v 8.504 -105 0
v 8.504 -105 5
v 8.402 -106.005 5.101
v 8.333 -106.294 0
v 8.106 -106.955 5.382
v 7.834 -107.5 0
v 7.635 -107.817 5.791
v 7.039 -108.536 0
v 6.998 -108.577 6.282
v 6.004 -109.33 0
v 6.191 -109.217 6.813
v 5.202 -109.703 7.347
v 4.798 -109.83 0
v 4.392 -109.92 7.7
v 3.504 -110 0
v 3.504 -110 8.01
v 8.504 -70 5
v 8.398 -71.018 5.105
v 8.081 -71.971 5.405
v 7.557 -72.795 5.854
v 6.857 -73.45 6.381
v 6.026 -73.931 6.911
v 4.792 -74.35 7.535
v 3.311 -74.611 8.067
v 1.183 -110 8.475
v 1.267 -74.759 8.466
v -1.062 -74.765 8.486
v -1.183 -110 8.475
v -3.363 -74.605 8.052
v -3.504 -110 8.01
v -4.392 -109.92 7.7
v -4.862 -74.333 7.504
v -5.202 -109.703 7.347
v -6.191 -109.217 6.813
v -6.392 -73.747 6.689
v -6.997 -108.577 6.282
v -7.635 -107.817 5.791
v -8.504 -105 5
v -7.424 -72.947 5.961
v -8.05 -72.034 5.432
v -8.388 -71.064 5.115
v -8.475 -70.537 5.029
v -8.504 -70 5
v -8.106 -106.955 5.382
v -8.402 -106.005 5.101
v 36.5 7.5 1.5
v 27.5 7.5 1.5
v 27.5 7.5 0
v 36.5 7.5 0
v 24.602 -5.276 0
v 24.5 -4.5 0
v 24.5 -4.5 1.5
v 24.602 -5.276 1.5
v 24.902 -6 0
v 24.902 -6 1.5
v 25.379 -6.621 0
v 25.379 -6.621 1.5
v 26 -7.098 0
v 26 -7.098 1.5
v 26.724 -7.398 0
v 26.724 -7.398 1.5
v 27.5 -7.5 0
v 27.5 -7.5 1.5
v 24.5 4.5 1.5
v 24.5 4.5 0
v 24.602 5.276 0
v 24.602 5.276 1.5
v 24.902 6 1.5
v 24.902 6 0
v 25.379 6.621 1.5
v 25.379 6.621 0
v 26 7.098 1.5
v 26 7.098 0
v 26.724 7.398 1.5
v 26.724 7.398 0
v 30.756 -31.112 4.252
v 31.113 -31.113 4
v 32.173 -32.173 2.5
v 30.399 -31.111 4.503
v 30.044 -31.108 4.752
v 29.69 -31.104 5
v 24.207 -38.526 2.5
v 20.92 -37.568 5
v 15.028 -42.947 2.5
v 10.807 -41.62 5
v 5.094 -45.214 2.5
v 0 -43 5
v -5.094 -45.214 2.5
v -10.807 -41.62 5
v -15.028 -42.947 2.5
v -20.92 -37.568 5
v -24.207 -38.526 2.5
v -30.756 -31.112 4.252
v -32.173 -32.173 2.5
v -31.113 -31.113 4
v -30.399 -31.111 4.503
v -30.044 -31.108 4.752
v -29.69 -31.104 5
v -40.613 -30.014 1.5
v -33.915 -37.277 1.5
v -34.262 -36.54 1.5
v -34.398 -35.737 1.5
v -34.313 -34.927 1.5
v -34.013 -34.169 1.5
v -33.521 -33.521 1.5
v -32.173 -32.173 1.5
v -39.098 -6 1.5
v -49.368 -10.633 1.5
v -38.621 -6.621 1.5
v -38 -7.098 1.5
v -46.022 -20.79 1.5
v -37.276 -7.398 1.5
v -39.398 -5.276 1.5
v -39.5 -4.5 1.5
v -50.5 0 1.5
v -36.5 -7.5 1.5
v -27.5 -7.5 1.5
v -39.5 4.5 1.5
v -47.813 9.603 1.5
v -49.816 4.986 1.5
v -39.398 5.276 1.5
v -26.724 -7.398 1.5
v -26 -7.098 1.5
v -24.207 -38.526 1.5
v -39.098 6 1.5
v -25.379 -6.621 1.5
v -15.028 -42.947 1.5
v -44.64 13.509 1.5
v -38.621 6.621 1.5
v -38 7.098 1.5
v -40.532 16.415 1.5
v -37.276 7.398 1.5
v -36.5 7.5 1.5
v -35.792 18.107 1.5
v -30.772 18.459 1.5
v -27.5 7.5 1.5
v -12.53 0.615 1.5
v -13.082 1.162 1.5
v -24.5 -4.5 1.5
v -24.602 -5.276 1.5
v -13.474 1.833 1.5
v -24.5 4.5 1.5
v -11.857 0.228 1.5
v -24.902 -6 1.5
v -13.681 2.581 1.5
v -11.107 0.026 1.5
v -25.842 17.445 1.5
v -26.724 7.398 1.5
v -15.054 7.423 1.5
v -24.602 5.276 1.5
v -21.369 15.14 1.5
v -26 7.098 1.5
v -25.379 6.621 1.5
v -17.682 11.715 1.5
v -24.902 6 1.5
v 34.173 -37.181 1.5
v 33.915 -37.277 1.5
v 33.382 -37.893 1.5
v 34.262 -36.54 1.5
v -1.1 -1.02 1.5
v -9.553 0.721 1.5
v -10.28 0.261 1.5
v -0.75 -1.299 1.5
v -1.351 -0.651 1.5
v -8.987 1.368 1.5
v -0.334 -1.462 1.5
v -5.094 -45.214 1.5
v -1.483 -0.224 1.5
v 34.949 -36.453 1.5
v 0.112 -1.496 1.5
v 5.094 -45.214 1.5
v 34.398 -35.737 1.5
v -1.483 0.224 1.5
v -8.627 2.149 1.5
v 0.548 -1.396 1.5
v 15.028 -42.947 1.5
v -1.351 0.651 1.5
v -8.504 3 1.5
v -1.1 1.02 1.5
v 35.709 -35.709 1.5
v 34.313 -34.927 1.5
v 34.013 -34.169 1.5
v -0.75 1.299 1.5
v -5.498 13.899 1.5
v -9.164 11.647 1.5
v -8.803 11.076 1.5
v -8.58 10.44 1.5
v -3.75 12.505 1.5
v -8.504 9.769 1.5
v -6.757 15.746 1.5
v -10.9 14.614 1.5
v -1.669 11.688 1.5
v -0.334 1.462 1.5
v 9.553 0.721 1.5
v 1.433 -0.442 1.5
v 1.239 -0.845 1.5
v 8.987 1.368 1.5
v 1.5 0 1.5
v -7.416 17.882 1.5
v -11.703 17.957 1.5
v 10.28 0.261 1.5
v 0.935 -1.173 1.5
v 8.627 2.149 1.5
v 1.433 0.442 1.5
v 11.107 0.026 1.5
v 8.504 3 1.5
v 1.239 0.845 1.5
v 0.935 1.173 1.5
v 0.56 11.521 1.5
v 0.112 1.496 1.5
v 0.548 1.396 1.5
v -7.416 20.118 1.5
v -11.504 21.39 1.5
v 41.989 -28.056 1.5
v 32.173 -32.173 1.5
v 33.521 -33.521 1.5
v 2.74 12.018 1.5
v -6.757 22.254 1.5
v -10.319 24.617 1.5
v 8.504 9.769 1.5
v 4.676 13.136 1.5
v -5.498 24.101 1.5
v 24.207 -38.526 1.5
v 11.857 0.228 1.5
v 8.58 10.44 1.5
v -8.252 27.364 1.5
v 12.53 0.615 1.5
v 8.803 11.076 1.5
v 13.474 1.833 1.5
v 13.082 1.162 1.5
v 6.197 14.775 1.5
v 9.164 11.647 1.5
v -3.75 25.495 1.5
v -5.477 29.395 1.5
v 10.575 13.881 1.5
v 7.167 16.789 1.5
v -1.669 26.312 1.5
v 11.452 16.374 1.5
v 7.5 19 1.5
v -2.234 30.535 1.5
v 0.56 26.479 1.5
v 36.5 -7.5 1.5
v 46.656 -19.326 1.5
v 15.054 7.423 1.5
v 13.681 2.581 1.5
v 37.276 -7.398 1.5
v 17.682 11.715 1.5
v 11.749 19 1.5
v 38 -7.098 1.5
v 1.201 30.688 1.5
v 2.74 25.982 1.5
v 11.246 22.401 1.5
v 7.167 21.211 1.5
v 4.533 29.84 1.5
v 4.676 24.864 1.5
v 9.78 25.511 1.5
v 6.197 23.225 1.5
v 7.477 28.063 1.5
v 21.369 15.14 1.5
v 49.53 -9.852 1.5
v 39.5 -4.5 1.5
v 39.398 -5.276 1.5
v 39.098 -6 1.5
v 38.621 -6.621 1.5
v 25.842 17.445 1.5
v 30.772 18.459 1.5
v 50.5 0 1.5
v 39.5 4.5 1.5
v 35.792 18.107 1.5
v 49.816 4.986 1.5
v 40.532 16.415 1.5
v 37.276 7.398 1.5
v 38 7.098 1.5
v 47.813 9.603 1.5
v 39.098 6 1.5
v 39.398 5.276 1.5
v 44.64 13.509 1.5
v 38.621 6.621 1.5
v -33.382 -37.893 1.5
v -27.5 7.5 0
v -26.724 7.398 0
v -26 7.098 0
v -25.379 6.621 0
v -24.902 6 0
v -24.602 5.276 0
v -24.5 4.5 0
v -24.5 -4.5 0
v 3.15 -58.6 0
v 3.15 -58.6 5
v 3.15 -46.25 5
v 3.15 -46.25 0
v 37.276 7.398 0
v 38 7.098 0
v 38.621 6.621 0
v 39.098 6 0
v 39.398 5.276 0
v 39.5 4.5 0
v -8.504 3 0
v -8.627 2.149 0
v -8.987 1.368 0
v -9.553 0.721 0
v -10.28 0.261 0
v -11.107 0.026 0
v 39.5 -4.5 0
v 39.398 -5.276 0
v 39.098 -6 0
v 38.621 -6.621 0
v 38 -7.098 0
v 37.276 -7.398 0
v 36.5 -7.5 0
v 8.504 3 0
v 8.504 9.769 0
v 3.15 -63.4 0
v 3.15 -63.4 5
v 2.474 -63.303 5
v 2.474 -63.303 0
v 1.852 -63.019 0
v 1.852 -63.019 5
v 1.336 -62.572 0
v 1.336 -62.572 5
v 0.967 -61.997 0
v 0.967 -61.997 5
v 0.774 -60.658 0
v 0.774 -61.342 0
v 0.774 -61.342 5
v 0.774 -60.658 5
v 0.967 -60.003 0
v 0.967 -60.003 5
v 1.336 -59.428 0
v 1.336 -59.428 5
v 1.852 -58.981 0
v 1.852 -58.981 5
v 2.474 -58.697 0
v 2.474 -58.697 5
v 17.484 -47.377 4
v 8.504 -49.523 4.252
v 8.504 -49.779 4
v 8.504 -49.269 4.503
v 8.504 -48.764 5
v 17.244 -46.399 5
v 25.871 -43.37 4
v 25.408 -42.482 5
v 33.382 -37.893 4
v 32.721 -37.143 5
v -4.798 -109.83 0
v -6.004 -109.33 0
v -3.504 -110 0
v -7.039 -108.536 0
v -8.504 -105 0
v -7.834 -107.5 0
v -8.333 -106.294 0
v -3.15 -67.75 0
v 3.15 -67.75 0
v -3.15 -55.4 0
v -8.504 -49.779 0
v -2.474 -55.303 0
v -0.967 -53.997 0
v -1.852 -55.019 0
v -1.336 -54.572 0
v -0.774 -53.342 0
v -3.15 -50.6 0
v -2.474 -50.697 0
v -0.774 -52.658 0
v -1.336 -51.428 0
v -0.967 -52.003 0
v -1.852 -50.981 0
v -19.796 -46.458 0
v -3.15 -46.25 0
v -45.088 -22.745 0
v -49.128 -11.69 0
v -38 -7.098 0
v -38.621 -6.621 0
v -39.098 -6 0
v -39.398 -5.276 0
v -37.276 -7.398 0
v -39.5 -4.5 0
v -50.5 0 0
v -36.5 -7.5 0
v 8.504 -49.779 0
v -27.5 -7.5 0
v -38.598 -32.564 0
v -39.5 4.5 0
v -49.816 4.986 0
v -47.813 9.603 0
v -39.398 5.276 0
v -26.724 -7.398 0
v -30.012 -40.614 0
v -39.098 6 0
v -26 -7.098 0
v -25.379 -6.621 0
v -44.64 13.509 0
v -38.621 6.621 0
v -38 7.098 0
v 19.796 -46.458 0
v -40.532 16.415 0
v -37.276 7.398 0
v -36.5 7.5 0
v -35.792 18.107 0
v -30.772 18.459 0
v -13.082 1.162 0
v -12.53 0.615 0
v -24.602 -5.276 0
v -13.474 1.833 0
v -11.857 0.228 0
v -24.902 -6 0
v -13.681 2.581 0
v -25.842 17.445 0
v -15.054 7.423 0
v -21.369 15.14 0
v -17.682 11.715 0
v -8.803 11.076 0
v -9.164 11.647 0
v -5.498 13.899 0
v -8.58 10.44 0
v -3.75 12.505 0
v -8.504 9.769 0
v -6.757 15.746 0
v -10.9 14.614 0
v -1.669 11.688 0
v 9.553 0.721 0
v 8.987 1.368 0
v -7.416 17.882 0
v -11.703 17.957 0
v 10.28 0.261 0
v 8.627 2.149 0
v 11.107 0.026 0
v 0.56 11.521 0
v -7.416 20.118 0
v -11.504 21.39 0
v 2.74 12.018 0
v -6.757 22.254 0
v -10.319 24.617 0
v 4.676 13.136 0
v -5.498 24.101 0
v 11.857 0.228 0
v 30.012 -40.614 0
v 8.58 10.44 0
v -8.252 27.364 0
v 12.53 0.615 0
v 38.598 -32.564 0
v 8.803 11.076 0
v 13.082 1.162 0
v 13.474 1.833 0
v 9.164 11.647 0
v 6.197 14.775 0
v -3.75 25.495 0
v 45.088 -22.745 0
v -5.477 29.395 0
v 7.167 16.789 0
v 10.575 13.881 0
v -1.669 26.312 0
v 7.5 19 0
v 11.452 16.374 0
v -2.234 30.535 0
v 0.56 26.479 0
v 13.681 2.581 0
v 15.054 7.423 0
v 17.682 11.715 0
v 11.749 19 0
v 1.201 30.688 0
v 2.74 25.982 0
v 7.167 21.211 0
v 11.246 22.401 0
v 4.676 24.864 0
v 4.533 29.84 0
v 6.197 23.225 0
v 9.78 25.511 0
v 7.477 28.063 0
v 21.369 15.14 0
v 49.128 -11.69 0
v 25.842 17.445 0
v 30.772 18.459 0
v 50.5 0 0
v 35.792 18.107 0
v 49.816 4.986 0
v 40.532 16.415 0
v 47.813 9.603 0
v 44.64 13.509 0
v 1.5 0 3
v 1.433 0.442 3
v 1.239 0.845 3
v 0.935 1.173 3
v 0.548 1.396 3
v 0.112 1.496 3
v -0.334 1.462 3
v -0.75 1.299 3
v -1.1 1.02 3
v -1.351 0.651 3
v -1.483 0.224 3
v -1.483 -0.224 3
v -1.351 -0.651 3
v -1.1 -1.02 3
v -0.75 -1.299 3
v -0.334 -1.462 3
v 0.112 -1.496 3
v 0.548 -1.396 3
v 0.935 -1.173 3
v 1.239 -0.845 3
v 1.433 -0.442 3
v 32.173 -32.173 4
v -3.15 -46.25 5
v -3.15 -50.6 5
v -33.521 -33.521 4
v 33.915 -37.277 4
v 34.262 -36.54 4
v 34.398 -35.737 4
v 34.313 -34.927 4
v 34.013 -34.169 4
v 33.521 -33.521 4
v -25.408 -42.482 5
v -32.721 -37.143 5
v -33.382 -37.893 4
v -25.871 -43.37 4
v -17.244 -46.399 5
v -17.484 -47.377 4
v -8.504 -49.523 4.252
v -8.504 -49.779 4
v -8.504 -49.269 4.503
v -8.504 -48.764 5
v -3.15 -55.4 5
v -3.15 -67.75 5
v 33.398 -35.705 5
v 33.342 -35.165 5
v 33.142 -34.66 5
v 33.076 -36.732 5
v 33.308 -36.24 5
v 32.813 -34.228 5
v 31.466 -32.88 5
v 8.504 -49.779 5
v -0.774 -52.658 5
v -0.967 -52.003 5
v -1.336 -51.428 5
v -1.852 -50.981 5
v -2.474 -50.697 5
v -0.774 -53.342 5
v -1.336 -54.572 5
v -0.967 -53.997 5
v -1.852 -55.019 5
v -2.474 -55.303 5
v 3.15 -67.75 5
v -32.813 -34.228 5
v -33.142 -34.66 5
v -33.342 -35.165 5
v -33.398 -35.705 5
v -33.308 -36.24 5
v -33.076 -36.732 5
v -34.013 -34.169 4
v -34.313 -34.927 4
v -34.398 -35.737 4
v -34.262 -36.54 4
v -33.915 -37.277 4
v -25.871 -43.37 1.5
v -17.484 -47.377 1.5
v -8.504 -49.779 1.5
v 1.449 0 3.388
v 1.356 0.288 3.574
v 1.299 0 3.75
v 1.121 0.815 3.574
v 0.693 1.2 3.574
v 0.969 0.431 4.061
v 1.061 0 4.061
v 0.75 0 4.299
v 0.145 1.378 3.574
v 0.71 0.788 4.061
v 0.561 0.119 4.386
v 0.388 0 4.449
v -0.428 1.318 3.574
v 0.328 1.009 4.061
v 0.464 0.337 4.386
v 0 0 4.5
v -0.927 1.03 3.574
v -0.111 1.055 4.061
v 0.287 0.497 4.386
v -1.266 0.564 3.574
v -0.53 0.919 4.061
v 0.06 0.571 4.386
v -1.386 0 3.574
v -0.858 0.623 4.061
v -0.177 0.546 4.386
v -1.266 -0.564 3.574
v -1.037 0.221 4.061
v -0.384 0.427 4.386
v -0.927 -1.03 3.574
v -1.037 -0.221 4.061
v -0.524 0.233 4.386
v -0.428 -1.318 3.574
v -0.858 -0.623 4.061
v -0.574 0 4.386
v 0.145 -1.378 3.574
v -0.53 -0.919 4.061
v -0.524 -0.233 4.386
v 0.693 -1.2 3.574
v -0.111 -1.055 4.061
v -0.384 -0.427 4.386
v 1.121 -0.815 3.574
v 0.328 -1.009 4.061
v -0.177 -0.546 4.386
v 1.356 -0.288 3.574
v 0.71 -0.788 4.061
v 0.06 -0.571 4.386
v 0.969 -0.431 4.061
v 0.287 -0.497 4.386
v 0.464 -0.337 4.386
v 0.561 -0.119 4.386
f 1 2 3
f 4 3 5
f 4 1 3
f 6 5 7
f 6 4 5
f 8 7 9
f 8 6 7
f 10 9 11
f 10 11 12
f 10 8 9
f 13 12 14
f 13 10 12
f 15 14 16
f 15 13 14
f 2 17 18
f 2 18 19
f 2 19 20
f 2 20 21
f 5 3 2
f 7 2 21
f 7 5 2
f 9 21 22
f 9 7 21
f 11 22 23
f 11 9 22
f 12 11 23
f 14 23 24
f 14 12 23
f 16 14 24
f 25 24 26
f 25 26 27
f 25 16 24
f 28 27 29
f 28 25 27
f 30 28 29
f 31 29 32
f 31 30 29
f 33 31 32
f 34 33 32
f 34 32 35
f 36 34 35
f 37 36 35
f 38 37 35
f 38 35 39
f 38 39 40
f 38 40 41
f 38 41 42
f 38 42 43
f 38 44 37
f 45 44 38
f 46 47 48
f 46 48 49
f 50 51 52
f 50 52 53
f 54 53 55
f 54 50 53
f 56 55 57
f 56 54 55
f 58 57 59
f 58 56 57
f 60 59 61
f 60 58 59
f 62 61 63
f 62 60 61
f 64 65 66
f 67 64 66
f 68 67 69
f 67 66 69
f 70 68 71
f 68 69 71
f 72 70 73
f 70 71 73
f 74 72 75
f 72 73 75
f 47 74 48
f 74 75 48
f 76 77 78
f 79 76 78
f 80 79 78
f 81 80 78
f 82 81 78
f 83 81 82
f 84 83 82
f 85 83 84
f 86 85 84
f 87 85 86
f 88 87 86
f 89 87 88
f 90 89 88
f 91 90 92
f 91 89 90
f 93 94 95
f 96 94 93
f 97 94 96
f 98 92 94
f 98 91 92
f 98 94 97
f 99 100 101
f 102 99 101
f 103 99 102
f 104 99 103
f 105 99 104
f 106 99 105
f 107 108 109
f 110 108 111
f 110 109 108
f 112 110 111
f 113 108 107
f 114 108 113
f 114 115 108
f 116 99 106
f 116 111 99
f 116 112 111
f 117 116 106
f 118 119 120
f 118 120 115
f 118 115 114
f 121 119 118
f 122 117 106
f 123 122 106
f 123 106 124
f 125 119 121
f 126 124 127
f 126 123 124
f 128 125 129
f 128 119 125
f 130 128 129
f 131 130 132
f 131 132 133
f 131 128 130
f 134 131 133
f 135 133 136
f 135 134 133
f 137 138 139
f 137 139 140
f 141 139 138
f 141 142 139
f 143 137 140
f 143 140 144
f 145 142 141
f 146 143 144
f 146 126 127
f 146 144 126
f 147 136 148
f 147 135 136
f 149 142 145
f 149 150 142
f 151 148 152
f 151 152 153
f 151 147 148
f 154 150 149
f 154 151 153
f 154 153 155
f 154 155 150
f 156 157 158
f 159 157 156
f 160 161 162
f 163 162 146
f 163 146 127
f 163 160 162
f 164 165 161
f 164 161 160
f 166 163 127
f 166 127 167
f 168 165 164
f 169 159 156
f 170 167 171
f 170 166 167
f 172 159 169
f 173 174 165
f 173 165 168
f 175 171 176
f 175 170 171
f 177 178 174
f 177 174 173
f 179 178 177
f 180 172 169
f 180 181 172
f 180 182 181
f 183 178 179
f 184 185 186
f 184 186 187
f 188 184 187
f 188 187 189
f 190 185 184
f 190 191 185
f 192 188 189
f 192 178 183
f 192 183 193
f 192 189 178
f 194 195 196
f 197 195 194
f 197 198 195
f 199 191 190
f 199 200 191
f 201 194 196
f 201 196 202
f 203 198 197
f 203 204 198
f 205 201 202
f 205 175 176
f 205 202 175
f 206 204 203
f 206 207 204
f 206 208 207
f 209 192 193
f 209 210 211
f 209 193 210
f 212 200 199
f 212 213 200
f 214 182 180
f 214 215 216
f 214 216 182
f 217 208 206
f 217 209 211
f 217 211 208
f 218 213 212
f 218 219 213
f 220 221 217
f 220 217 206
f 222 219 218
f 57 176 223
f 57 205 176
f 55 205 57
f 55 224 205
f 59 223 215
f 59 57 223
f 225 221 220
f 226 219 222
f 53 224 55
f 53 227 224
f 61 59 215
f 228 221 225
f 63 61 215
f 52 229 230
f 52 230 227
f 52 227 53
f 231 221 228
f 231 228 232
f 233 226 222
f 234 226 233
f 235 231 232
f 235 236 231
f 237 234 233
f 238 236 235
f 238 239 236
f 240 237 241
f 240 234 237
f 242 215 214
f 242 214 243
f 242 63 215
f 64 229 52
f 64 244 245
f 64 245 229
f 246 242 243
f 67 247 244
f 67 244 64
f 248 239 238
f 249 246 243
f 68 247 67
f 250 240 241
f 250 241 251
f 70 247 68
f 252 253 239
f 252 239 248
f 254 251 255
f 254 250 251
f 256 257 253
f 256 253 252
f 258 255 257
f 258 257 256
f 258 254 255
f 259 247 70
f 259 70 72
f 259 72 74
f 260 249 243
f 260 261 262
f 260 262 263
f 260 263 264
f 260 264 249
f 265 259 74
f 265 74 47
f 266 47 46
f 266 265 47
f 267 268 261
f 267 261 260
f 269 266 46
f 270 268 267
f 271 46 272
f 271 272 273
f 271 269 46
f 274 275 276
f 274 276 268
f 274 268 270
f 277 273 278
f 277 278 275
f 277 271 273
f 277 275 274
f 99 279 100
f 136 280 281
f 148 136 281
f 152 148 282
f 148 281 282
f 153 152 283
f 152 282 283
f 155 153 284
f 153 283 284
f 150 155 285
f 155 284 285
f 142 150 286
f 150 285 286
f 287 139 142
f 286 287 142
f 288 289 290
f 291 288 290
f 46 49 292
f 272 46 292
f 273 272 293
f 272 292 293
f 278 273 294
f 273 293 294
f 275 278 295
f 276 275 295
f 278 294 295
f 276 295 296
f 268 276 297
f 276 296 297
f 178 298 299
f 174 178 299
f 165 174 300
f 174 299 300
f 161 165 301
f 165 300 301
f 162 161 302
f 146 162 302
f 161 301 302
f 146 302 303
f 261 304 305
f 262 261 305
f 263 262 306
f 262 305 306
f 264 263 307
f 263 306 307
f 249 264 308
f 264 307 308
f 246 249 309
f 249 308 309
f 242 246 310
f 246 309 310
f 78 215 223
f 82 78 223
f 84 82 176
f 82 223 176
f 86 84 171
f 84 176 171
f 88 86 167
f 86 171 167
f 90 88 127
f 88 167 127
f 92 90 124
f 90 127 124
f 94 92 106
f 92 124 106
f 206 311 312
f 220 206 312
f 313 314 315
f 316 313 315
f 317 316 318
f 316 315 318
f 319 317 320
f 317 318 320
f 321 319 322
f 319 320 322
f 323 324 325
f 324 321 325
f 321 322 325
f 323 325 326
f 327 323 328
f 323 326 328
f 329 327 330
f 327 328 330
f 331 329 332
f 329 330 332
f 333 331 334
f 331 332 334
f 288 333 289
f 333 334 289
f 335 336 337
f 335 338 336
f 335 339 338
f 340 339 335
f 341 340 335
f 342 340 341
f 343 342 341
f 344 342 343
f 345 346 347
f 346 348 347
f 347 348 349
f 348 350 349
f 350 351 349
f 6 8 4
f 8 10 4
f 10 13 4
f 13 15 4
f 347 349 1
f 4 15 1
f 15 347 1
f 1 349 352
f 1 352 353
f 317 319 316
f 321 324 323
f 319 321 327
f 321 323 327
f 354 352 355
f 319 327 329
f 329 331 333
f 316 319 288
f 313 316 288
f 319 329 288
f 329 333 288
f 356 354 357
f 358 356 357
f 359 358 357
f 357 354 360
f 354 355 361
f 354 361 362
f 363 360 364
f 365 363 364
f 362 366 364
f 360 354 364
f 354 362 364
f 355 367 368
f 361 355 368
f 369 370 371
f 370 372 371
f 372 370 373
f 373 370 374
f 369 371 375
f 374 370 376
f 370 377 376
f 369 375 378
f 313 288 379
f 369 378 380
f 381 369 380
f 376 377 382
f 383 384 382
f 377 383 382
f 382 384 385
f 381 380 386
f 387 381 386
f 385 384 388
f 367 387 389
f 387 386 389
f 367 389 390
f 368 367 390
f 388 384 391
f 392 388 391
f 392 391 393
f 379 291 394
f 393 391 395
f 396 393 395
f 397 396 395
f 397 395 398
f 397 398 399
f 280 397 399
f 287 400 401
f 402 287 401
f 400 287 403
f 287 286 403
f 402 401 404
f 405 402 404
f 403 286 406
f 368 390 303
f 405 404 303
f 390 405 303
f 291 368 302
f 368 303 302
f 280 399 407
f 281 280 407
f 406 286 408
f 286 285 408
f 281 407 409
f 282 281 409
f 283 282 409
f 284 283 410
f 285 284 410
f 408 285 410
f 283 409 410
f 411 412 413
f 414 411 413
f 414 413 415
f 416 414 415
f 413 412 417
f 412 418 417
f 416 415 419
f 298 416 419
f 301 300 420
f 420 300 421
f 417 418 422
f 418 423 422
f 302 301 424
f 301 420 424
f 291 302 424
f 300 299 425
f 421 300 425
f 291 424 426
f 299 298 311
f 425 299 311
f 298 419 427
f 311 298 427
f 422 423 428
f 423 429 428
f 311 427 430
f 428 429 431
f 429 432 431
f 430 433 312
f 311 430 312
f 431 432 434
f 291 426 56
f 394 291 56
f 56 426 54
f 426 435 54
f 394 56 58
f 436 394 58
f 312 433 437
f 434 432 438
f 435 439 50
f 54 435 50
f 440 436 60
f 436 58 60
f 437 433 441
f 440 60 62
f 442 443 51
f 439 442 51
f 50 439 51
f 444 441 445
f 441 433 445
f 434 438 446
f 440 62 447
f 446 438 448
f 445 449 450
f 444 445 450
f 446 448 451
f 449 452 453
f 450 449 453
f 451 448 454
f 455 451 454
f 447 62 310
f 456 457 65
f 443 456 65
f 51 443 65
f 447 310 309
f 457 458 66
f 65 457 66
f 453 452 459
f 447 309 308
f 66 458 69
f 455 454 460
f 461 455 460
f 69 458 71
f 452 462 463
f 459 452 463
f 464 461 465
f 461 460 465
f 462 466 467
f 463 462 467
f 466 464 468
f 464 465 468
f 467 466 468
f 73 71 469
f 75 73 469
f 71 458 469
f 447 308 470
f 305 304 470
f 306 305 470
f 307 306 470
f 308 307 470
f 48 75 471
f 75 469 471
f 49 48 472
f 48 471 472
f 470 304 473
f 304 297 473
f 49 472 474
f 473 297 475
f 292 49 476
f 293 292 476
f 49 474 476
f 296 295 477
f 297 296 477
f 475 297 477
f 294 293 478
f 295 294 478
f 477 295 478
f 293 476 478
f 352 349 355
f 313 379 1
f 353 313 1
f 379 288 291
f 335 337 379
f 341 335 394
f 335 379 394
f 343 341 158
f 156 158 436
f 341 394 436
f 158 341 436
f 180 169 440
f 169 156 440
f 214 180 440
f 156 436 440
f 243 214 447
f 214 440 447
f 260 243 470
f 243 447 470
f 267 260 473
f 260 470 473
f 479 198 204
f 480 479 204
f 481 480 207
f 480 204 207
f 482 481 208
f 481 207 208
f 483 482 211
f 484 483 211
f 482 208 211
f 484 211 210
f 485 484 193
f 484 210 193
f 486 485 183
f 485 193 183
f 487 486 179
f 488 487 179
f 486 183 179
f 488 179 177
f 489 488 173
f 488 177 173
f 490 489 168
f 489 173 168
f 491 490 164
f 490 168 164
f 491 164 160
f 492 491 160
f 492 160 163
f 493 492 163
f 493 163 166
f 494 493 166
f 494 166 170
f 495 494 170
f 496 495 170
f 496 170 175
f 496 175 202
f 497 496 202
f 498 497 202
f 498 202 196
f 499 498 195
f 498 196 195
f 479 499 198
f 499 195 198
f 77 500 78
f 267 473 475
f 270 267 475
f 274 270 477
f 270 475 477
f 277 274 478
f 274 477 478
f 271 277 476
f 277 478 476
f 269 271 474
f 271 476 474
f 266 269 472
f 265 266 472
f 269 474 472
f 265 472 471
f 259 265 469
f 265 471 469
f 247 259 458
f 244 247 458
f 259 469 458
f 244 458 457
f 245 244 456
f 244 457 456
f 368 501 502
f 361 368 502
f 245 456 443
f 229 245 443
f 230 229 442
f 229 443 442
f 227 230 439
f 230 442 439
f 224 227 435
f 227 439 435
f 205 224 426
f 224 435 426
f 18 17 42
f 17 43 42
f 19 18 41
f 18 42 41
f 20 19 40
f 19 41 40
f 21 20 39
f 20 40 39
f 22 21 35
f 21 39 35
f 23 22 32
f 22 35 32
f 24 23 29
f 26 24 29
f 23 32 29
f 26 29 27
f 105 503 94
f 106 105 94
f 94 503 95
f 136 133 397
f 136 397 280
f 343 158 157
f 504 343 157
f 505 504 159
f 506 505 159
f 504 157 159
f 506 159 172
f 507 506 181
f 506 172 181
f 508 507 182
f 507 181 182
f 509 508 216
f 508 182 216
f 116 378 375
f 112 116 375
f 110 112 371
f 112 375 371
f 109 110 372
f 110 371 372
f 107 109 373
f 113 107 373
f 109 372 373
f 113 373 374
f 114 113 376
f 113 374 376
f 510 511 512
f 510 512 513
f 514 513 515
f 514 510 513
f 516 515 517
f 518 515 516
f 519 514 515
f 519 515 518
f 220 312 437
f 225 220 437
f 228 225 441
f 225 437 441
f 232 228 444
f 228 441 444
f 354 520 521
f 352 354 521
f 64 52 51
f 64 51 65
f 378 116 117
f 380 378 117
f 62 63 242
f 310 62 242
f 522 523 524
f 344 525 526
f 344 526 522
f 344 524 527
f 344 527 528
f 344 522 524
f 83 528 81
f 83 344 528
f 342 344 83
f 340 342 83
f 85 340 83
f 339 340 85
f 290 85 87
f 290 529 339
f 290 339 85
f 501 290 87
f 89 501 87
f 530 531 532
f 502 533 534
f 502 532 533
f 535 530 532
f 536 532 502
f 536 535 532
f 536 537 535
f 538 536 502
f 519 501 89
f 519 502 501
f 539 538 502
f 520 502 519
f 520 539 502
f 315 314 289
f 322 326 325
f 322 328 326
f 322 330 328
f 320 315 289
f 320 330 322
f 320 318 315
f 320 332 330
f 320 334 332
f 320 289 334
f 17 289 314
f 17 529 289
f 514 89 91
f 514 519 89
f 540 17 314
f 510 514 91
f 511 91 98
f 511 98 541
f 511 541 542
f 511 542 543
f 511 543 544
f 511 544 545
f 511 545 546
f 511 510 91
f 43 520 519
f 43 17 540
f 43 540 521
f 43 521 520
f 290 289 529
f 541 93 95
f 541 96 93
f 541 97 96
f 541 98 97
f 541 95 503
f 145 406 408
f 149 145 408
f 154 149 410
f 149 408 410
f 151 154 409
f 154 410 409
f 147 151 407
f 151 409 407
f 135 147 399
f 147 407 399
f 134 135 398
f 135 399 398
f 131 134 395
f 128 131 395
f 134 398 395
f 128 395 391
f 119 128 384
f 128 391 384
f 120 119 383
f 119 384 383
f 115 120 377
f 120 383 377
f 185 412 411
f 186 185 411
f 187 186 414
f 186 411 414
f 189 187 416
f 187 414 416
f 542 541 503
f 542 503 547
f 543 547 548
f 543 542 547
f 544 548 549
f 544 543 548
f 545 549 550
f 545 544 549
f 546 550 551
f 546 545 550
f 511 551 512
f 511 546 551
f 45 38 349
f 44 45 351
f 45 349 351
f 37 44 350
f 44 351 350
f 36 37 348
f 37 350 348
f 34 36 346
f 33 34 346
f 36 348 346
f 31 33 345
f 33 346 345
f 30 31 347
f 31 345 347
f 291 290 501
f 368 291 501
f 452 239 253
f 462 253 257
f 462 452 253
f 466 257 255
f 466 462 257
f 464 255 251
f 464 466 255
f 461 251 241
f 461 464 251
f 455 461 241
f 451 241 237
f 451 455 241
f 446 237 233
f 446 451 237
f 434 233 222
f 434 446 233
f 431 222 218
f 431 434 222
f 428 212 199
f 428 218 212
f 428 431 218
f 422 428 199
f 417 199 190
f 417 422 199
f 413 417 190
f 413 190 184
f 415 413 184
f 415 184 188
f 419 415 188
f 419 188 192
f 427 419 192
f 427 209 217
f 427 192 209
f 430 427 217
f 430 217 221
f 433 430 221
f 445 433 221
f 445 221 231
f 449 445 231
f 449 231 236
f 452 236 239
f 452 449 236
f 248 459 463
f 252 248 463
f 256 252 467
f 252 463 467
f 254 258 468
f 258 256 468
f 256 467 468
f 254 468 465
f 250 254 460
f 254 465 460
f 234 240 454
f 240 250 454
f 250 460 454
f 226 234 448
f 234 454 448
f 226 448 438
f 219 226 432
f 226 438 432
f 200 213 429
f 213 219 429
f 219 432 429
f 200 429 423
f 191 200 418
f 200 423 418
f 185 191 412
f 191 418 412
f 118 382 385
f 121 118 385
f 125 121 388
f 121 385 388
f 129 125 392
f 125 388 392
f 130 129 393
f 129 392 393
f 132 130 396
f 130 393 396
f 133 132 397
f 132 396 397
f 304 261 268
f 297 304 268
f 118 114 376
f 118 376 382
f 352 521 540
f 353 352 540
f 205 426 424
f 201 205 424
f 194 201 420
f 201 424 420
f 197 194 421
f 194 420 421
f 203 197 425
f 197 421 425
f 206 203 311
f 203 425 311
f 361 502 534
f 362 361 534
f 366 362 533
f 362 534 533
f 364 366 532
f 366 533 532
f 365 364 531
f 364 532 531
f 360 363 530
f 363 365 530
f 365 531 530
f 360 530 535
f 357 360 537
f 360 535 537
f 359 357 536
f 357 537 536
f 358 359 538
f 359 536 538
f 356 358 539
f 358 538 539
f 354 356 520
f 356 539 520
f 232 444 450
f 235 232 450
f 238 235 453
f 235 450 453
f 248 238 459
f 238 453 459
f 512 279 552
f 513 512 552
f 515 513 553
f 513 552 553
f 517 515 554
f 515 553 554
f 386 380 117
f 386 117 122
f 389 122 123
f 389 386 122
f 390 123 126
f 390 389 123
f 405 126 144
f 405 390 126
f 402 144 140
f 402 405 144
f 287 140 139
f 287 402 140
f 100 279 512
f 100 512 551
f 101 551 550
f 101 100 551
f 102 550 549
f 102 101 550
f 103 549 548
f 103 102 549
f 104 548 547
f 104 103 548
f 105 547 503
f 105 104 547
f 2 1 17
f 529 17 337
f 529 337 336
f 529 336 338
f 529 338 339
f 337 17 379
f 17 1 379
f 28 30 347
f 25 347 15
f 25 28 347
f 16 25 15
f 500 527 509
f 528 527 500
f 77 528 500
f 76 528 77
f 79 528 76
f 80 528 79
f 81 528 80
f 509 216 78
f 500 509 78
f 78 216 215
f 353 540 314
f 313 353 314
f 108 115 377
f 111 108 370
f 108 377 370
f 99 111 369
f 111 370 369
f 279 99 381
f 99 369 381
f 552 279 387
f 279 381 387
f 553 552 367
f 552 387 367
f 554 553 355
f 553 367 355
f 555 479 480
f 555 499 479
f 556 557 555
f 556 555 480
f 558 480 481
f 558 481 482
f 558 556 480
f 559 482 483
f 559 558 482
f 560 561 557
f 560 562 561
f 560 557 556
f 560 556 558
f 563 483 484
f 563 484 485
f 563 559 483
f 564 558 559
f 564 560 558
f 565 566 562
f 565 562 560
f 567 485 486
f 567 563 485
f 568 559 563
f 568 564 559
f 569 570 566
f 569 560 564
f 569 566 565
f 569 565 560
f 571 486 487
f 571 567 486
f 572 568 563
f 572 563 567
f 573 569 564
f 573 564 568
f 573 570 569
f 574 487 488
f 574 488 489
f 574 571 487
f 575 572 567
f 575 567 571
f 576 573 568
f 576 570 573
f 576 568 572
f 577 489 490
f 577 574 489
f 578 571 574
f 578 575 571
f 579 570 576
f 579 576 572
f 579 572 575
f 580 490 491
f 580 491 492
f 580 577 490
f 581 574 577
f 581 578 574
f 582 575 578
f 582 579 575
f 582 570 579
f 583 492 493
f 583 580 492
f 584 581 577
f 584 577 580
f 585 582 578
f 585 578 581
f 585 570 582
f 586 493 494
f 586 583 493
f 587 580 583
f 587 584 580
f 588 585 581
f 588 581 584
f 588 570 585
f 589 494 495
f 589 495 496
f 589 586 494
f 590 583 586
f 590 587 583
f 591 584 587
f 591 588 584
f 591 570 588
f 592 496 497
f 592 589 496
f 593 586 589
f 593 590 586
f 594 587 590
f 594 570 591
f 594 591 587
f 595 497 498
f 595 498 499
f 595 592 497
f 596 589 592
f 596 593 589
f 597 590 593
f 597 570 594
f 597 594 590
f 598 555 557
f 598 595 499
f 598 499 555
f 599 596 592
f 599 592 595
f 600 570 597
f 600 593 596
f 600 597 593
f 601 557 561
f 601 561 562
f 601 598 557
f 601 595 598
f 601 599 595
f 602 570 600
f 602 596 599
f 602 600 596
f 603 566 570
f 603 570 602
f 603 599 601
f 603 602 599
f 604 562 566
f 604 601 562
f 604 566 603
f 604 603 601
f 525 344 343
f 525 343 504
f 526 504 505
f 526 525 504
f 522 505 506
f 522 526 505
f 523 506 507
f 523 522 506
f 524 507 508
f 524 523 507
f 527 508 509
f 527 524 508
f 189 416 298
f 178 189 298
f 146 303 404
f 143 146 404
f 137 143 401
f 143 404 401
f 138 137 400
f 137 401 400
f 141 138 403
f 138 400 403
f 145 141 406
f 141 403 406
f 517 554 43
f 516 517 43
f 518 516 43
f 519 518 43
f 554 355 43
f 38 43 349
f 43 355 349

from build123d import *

# Parameters (mm, degrees)
F1_DEPTH     = 5
F3_DEPTH     = 5.001
F5_DEPTH     = 35
F6_T4_DEPTH  = 17.0072864353
F6_S5_R      = 12
F6_T6_DEPTH  = 11
F6_T7_DEPTH  = 30
F7_R         = 7.5
F8_DEPTH     = 5
F9_R         = 45.5
F10_DEPTH    = 3.5
F12_DEPTH    = 1.5
F14_DEPTH    = 3.5
F18_W        = 15
F18_H        = 15
F19_DEPTH    = 1.5010001
F20_DEPTH    = 5.0010001
F21_R        = 1.5
F22_DEPTH    = 3
F23_T1_DEPTH = 1.5
F23_T3_DEPTH = 11.4776669635
F24_R        = 1.5
F25_SIZE     = 1


# Not quite as in the source:
# - a fillet or chamfer that OpenCascade refuses, or shapes differently, is made with other operations: its cross-section is extruded or revolved along the edge and cut away or added
# - a feature names something its author has since deleted; it is built from what else it names


with BuildPart() as f1:
    # F0 (on Top) → F1 (new body)
    with BuildSketch(Plane.XY):
        Polygon((8.5036432176, -40), (-8.5036432176, -40), (-8.5036432176, -110), (0, -110), (8.5036432176, -110), align=None)
    extrude(amount=F1_DEPTH)

    # F2 (on face) → F3 (cut, through all)
    with BuildSketch(Plane.XY.offset(5)):
        with BuildLine():
            Line((-3.15, -67.75), (3.15, -67.75))
            Line((3.15, -67.75), (3.15, -63.4))
            ThreePointArc((3.15, -63.4), (0.75, -61), (3.15, -58.6))
            Line((3.15, -58.6), (3.15, -46.25))
            Line((3.15, -46.25), (-3.15, -46.25))
            Line((-3.15, -46.25), (-3.15, -50.6))
            ThreePointArc((-3.15, -50.6), (-0.75, -53), (-3.15, -55.4))
            Line((-3.15, -55.4), (-3.15, -67.75))
        make_face()
    extrude(amount=-F3_DEPTH, mode=Mode.SUBTRACT)

    # F4 (on face) → F5 (join)
    with BuildSketch(Plane.XZ.offset(110)):
        with BuildLine():
            ThreePointArc((8.5036432176, 5), (0, 8.5331202898), (-8.5036432176, 5))
            Line((-8.5036432176, 5), (8.5036432176, 5))
        make_face()
    extrude(amount=-F5_DEPTH)

    # F6: fillet of radius 5 on 3 edges, made by hand


with BuildPart() as f6_tool2:
    # F6_s3 → F6_t4 (new body)
    with BuildSketch(Plane.YZ.offset(-8.5036432176)):
        with BuildLine():
            ThreePointArc((-70, 5), (-73.5355339059, 6.4644660941), (-75, 10))
            Line((-75, 10), (-75, 5))
            Line((-75, 5), (-70, 5))
        make_face()
    extrude(amount=F6_T4_DEPTH)

    # F6_s5 → F6_t6 (intersect, symmetric)
    with BuildSketch(Plane.XZ.offset(72.5)):
        with Locations((0, -3.4668797102)):
            Circle(F6_S5_R)
    extrude(amount=F6_T6_DEPTH, both=True, mode=Mode.INTERSECT)


with BuildPart() as f1_1:
    add(f1.part)

    # F6_t1: union F6_tool2
    add(f6_tool2.part)

    # F6_s8 → F6_t7 (cut)
    with BuildSketch(Plane.XY.offset(-12.5)):
        with BuildLine():
            ThreePointArc((-8.5036432176, -105), (-7.0391771236, -108.5355339059), (-3.5036432176, -110))
            Line((-3.5036432176, -110), (-8.5036432176, -110))
            Line((-8.5036432176, -110), (-8.5036432176, -105))
        make_face()
        with BuildLine():
            ThreePointArc((8.5036432176, -105), (7.0391771236, -108.5355339059), (3.5036432176, -110))
            Line((3.5036432176, -110), (8.5036432176, -110))
            Line((8.5036432176, -110), (8.5036432176, -105))
        make_face()
    extrude(amount=F6_T7_DEPTH, mode=Mode.SUBTRACT)

    # F7 (on Top) → F8 (join)
    with BuildSketch(Plane.XY):
        with BuildLine():
            Line((-8.5036432176, 0), (-8.5036432176, -40))
            Line((-8.5036432176, -40), (8.5036432176, -40))
            Line((8.5036432176, -40), (8.5036432176, 0))
            Line((8.5036432176, 0), (8.5036432176, 10.8923699759))
            ThreePointArc((8.5036432176, 10.8923699759), (0, 7.2507186355), (-8.5036432176, 10.8923699759))
            Line((-8.5036432176, 10.8923699759), (-8.5036432176, 0))
        make_face()
        with BuildLine():
            ThreePointArc((11.7492813645, 19), (-4.3665727862, 29.9077337098), (-8.5036432176, 10.8923699759))
            ThreePointArc((-8.5036432176, 10.8923699759), (0, 7.2507186355), (8.5036432176, 10.8923699759))
            ThreePointArc((8.5036432176, 10.8923699759), (10.9077337098, 14.6334272138), (11.7492813645, 19))
        make_face()
        with Locations((0, 19)):
            Circle(F7_R, mode=Mode.SUBTRACT)
    extrude(amount=F8_DEPTH)

    # F9 (on face) → F10 (cut)
    with BuildSketch(Plane.XY.offset(5)):
        Circle(F9_R)
    extrude(amount=-F10_DEPTH, mode=Mode.SUBTRACT)

    # F11 (on Top) → F12 (join)
    with BuildSketch(Plane.XY):
        with BuildLine():
            ThreePointArc((-13.5, 0), (-32, 18.5), (-50.5, 0))
            ThreePointArc((-50.5, 0), (0, -50.5), (50.5, 0))
            ThreePointArc((50.5, 0), (32, 18.5), (13.5, 0))
            Line((13.5, 0), (-13.5, 0))
        make_face()
    extrude(amount=F12_DEPTH)

    # F13 (on face) → F14 (join)
    with BuildSketch(Plane.XY.offset(1.5)):
        with BuildLine():
            ThreePointArc((32.173358544, -32.173358544), (0, -45.5), (-32.173358544, -32.173358544))
            Line((-32.173358544, -32.173358544), (-35.7088924499, -35.7088924499))
            ThreePointArc((-35.7088924499, -35.7088924499), (0, -50.5), (35.7088924499, -35.7088924499))
            Line((35.7088924499, -35.7088924499), (32.173358544, -32.173358544))
        make_face()
    extrude(amount=F14_DEPTH)

    # F17: sweep along a path in F17_path
    with BuildLine(Plane(origin=(32.173358544, -32.173358544, 5), x_dir=(0, 1, 0), z_dir=(0, 0, 1))) as f17_path:
        ThreePointArc((0, 0), (-13.326641456, 32.173358544), (0, 64.346717088))
    # F16 (on face) → F17 (sweep)
    with BuildSketch(Plane(origin=(0, 0, 0), x_dir=(0.7071067812, 0.7071067812, 0), z_dir=(0.7071067812, -0.7071067812, 0))):
        Polygon((-43, 5), (-45.5, 5), (-45.5, 2.5), align=None)
    sweep(path=f17_path.line)

    # F18 (on face) → F19 (cut, through all)
    with BuildSketch(Plane.XY.offset(1.5)):
        with Locations((-32, 0)):
            Rectangle(F18_W, F18_H)
        with Locations((32, 0)):
            Rectangle(F18_W, F18_H)
    extrude(amount=-F19_DEPTH, mode=Mode.SUBTRACT)

    # F2 (on face) → F20 (cut, through all)
    with BuildSketch(Plane.XY.offset(5)):
        with BuildLine():
            Line((-3.15, -67.75), (3.15, -67.75))
            Line((3.15, -67.75), (3.15, -63.4))
            ThreePointArc((3.15, -63.4), (0.75, -61), (3.15, -58.6))
            Line((3.15, -58.6), (3.15, -46.25))
            Line((3.15, -46.25), (-3.15, -46.25))
            Line((-3.15, -46.25), (-3.15, -50.6))
            ThreePointArc((-3.15, -50.6), (-0.75, -53), (-3.15, -55.4))
            Line((-3.15, -55.4), (-3.15, -67.75))
        make_face()
    extrude(amount=-F20_DEPTH, mode=Mode.SUBTRACT)

    # F21 (on face) → F22 (join)
    with BuildSketch(Plane.XY.offset(1.5)):
        Circle(F21_R)
    extrude(amount=F22_DEPTH)

    # F23: fillet of radius 3 on 16 edges, made by hand

    # F23_s2 → F23_t1 (join)
    with BuildSketch(Plane.XY):
        with BuildLine():
            ThreePointArc((-10.710331144, 0), (-12.6780946011, 0.7355117627), (-13.6809826122, 2.5813953488))
            ThreePointArc((-13.6809826122, 2.5813953488), (-13.5453011177, 1.2938659758), (-13.5, 0))
            Line((-13.5, 0), (-10.710331144, 0))
        make_face()
        with BuildLine():
            ThreePointArc((13.6809826122, 2.5813953488), (12.6780946011, 0.7355117627), (10.710331144, 0))
            Line((10.710331144, 0), (13.5, 0))
            ThreePointArc((13.5, 0), (13.5453011177, 1.2938659758), (13.6809826122, 2.5813953488))
        make_face()
        with BuildLine():
            ThreePointArc((39.5, -4.5), (38.6213203436, -6.6213203436), (36.5, -7.5))
            Line((36.5, -7.5), (39.5, -7.5))
            Line((39.5, -7.5), (39.5, -4.5))
        make_face()
        with BuildLine():
            ThreePointArc((24.5, -4.5), (25.3786796564, -6.6213203436), (27.5, -7.5))
            Line((27.5, -7.5), (24.5, -7.5))
            Line((24.5, -7.5), (24.5, -4.5))
        make_face()
        with BuildLine():
            ThreePointArc((24.5, 4.5), (25.3786796564, 6.6213203436), (27.5, 7.5))
            Line((27.5, 7.5), (24.5, 7.5))
            Line((24.5, 7.5), (24.5, 4.5))
        make_face()
        with BuildLine():
            ThreePointArc((36.5, 7.5), (38.6213203436, 6.6213203436), (39.5, 4.5))
            Line((39.5, 4.5), (39.5, 7.5))
            Line((39.5, 7.5), (36.5, 7.5))
        make_face()
        with BuildLine():
            ThreePointArc((-27.5, 7.5), (-25.3786796564, 6.6213203436), (-24.5, 4.5))
            Line((-24.5, 4.5), (-24.5, 7.5))
            Line((-24.5, 7.5), (-27.5, 7.5))
        make_face()
        with BuildLine():
            ThreePointArc((-36.5, -7.5), (-38.6213203436, -6.6213203436), (-39.5, -4.5))
            Line((-39.5, -4.5), (-39.5, -7.5))
            Line((-39.5, -7.5), (-36.5, -7.5))
        make_face()
        with BuildLine():
            ThreePointArc((-27.5, -7.5), (-25.3786796564, -6.6213203436), (-24.5, -4.5))
            Line((-24.5, -4.5), (-24.5, -7.5))
            Line((-24.5, -7.5), (-27.5, -7.5))
        make_face()
        with BuildLine():
            ThreePointArc((-39.5, 4.5), (-38.6213203436, 6.6213203436), (-36.5, 7.5))
            Line((-36.5, 7.5), (-39.5, 7.5))
            Line((-39.5, 7.5), (-39.5, 4.5))
        make_face()
        with BuildLine():
            ThreePointArc((11.5036432176, 0), (9.3823228741, 0.8786796564), (8.5036432176, 3))
            Line((8.5036432176, 3), (8.5036432176, 0))
            Line((8.5036432176, 0), (11.5036432176, 0))
        make_face()
        with BuildLine():
            ThreePointArc((-8.5036432176, 3), (-9.3823228741, 0.8786796564), (-11.5036432176, 0))
            Line((-11.5036432176, 0), (-8.5036432176, 0))
            Line((-8.5036432176, 0), (-8.5036432176, 3))
        make_face()
        with BuildLine():
            ThreePointArc((-9.163805174, 11.6467498809), (-8.6734917967, 10.7643189961), (-8.5036432176, 9.7692094873))
            Line((-8.5036432176, 9.7692094873), (-8.5036432176, 10.8923699759))
            ThreePointArc((-8.5036432176, 10.8923699759), (-8.8417733192, 11.2625160968), (-9.163805174, 11.6467498809))
        make_face()
        with BuildLine():
            ThreePointArc((8.5036432176, 9.7692094873), (8.6734917967, 10.7643189961), (9.163805174, 11.6467498809))
            ThreePointArc((9.163805174, 11.6467498809), (8.8417733192, 11.2625160968), (8.5036432176, 10.8923699759))
            Line((8.5036432176, 10.8923699759), (8.5036432176, 9.7692094873))
        make_face()
    extrude(amount=F23_T1_DEPTH)

    # F23_s4 → F23_t3 (cut)
    with BuildSketch(Plane.XY.offset(1.5)):
        with BuildLine():
            ThreePointArc((33.382302863, -37.8928998041), (34.3976980488, -35.7366206113), (33.5205161058, -33.5205161058))
            Line((33.5205161058, -33.5205161058), (35.7088924499, -35.7088924499))
            ThreePointArc((35.7088924499, -35.7088924499), (34.5628527392, -36.8192777024), (33.382302863, -37.8928998041))
        make_face()
        with BuildLine():
            ThreePointArc((-33.382302863, -37.8928998041), (-34.3976980488, -35.7366206113), (-33.5205161058, -33.5205161058))
            Line((-33.5205161058, -33.5205161058), (-35.7088924499, -35.7088924499))
            ThreePointArc((-35.7088924499, -35.7088924499), (-34.5628527392, -36.8192777024), (-33.382302863, -37.8928998041))
        make_face()
    extrude(amount=F23_T3_DEPTH, mode=Mode.SUBTRACT)

    # F24
    f24_edges = [f1_1.edges().sort_by_distance(p)[0] for p in [
        (-1.5, 0, 4.5),
    ]]
    fillet(f24_edges, radius=F24_R)

    # F25
    f25_edges = [f1_1.edges().sort_by_distance(p)[0] for p in [
        (21.769872, -45.566684, 5),
        (-21.769872, -45.566684, 5),
        (-34.397698, -35.736621, 5),
        (-31.963054, -31.963054, 5),
        (31.963054, -31.963054, 5),
        (34.397698, -35.736621, 5),
    ]]
    chamfer(f25_edges, length=F25_SIZE)


solid = f1_1.part
